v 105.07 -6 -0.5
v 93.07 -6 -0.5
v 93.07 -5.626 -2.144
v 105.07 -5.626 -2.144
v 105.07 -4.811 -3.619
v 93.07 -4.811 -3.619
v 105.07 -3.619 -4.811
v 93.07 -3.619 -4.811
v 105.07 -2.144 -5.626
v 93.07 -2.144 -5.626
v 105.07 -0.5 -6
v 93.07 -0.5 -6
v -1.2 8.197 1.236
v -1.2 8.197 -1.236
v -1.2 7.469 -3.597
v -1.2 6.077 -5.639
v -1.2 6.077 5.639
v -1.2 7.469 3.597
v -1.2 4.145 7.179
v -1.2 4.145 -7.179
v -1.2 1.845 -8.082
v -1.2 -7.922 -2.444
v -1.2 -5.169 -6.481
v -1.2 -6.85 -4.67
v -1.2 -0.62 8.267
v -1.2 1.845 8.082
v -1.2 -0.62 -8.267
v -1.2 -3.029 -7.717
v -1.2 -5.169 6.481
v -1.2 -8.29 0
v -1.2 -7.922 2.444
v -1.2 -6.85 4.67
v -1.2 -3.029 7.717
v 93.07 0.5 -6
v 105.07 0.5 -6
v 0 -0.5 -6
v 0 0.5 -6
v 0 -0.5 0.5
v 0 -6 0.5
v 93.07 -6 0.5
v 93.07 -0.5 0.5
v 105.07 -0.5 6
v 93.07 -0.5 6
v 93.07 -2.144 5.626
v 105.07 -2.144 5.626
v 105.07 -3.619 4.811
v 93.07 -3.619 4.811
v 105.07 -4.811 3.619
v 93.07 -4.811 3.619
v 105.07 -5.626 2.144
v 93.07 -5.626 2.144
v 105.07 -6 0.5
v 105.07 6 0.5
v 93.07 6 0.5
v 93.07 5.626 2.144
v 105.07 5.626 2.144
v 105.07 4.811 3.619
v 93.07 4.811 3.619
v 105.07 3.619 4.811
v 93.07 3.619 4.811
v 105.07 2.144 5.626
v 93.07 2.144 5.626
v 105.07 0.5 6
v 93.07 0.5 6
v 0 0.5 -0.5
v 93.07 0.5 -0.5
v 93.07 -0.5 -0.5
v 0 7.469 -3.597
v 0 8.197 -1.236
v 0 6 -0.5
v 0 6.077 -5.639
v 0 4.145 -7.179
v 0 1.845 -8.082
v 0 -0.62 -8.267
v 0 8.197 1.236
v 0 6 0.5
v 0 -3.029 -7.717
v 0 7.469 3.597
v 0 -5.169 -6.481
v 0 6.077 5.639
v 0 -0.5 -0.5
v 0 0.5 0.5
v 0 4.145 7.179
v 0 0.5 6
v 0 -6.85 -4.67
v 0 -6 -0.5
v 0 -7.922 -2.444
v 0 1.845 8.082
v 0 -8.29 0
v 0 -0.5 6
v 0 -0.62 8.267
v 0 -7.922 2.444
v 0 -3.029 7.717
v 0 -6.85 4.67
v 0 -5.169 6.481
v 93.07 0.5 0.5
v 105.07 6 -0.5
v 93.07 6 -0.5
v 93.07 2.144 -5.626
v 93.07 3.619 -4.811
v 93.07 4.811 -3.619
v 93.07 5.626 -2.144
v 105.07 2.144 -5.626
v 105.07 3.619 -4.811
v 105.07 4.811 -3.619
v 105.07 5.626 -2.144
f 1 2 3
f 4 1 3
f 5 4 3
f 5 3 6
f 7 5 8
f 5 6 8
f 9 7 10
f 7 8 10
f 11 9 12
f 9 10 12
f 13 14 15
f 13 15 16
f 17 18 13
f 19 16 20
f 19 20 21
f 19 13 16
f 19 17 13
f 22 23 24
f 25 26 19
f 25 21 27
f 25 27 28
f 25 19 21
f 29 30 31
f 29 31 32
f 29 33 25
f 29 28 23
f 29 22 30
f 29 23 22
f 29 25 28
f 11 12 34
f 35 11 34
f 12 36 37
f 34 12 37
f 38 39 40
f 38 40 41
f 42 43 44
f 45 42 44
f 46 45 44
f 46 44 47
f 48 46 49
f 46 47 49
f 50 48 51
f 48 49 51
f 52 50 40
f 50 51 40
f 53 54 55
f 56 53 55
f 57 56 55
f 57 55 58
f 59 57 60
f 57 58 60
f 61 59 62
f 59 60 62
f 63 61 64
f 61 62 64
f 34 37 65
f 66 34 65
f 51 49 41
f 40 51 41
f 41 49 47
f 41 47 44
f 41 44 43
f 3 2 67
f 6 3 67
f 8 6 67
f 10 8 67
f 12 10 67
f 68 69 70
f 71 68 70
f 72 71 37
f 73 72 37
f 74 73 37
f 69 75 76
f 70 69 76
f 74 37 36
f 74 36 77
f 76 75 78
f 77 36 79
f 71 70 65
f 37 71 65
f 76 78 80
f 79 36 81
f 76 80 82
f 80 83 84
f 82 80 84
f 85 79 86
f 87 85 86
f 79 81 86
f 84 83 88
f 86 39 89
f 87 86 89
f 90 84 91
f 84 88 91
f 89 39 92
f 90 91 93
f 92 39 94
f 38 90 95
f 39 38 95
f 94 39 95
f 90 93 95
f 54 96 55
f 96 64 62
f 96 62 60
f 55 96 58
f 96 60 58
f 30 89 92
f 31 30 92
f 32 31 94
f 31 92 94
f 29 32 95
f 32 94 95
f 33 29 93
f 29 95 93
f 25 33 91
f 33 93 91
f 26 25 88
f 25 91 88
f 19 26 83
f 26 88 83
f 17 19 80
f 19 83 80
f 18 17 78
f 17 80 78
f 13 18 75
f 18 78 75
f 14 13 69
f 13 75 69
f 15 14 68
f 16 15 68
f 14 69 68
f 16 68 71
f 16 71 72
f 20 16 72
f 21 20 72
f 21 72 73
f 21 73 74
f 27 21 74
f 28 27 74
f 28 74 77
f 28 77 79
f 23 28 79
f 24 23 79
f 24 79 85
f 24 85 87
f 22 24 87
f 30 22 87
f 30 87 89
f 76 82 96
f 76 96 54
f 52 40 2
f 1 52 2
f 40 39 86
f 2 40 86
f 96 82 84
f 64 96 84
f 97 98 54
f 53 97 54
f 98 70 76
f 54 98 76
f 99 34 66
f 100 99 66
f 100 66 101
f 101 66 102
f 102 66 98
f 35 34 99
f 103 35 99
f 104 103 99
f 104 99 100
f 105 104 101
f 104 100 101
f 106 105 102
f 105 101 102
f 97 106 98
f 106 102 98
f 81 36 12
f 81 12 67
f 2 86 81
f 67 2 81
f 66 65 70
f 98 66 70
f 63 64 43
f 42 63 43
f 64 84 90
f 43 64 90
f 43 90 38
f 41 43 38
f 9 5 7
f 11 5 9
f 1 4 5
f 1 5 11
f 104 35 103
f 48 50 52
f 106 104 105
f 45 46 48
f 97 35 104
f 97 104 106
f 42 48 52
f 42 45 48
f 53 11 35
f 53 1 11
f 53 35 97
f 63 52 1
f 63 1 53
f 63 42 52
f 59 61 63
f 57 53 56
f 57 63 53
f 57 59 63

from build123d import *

# Parameters (mm, degrees)
F0_W     = 1
F0_H     = 5.5
F0_H_2   = 1
F0_W_2   = 5.5
F1_DEPTH = 93.07
F3_DEPTH = 12
F4_R     = 8.29
F5_DEPTH = 1
F6_DEPTH = 1.2
F7_DEPTH = 1.2


with BuildPart() as f1:
    # F0 (on Right) → F1 (new body)
    with BuildSketch(Plane.YZ):
        with Locations((0, 3.25)):
            Rectangle(F0_W, F0_H)
        Rectangle(F0_W, F0_H_2)
        with Locations((3.25, 0)):
            Rectangle(F0_W_2, F0_H_2)
        with Locations((-3.25, 0)):
            Rectangle(F0_W_2, F0_H_2)
        with Locations((0, -3.25)):
            Rectangle(F0_W, F0_H)
    extrude(amount=F1_DEPTH)

    # F2 (on face) → F3 (join)
    with BuildSketch(Plane.YZ.offset(93.07)):
        with BuildLine():
            ThreePointArc((-6, -0.5), (-4.2573465915, -4.2573465915), (-0.5, -6))
            Line((-0.5, -6), (-0.5, -0.5))
            Line((-0.5, -0.5), (-6, -0.5))
        make_face()
        with BuildLine():
            ThreePointArc((0.5, -6), (4.2573465915, -4.2573465915), (6, -0.5))
            Line((6, -0.5), (0.5, -0.5))
            Line((0.5, -0.5), (0.5, -6))
        make_face()
        Polygon((6, -0.5), (6, 0.5), (0.5, 0.5), (0.5, 6), (-0.5, 6), (-0.5, 0.5), (-6, 0.5), (-6, -0.5), (-0.5, -0.5), (-0.5, -6), (0.5, -6), (0.5, -0.5), align=None)
        with BuildLine():
            Line((-0.5, 0.5), (-0.5, 6))
            ThreePointArc((-0.5, 6), (-4.2573465915, 4.2573465915), (-6, 0.5))
            Line((-6, 0.5), (-0.5, 0.5))
        make_face()
        with BuildLine():
            Line((0.5, 0.5), (6, 0.5))
            ThreePointArc((6, 0.5), (4.2573465915, 4.2573465915), (0.5, 6))
            Line((0.5, 6), (0.5, 0.5))
        make_face()
    extrude(amount=F3_DEPTH)

    # F4 (on face) → F5 (join)
    with BuildSketch(Plane(origin=(0, 0, 0), x_dir=(0, -1, 0), z_dir=(-1, 0, 0))):
        Circle(F4_R)
        Polygon((-0.5, 6), (0.5, 6), (0.5, 0.5), (6, 0.5), (6, -0.5), (0.5, -0.5), (0.5, -6), (-0.5, -6), (-0.5, -0.5), (-6, -0.5), (-6, 0.5), (-0.5, 0.5), align=None, mode=Mode.SUBTRACT)
        Polygon((0.5, 0.5), (0.5, 6), (-0.5, 6), (-0.5, 0.5), (-6, 0.5), (-6, -0.5), (-0.5, -0.5), (-0.5, -6), (0.5, -6), (0.5, -0.5), (6, -0.5), (6, 0.5), align=None)
    extrude(amount=F5_DEPTH)

    # F4 (on face) → F6 (join)
    with BuildSketch(Plane(origin=(0, 0, 0), x_dir=(0, -1, 0), z_dir=(-1, 0, 0))):
        Circle(F4_R)
        Polygon((-0.5, 6), (0.5, 6), (0.5, 0.5), (6, 0.5), (6, -0.5), (0.5, -0.5), (0.5, -6), (-0.5, -6), (-0.5, -0.5), (-6, -0.5), (-6, 0.5), (-0.5, 0.5), align=None, mode=Mode.SUBTRACT)
    extrude(amount=F6_DEPTH)

    # F4 (on face) → F7 (join)
    with BuildSketch(Plane(origin=(0, 0, 0), x_dir=(0, -1, 0), z_dir=(-1, 0, 0))):
        Polygon((0.5, 0.5), (0.5, 6), (-0.5, 6), (-0.5, 0.5), (-6, 0.5), (-6, -0.5), (-0.5, -0.5), (-0.5, -6), (0.5, -6), (0.5, -0.5), (6, -0.5), (6, 0.5), align=None)
    extrude(amount=F7_DEPTH)


solid = f1.part
